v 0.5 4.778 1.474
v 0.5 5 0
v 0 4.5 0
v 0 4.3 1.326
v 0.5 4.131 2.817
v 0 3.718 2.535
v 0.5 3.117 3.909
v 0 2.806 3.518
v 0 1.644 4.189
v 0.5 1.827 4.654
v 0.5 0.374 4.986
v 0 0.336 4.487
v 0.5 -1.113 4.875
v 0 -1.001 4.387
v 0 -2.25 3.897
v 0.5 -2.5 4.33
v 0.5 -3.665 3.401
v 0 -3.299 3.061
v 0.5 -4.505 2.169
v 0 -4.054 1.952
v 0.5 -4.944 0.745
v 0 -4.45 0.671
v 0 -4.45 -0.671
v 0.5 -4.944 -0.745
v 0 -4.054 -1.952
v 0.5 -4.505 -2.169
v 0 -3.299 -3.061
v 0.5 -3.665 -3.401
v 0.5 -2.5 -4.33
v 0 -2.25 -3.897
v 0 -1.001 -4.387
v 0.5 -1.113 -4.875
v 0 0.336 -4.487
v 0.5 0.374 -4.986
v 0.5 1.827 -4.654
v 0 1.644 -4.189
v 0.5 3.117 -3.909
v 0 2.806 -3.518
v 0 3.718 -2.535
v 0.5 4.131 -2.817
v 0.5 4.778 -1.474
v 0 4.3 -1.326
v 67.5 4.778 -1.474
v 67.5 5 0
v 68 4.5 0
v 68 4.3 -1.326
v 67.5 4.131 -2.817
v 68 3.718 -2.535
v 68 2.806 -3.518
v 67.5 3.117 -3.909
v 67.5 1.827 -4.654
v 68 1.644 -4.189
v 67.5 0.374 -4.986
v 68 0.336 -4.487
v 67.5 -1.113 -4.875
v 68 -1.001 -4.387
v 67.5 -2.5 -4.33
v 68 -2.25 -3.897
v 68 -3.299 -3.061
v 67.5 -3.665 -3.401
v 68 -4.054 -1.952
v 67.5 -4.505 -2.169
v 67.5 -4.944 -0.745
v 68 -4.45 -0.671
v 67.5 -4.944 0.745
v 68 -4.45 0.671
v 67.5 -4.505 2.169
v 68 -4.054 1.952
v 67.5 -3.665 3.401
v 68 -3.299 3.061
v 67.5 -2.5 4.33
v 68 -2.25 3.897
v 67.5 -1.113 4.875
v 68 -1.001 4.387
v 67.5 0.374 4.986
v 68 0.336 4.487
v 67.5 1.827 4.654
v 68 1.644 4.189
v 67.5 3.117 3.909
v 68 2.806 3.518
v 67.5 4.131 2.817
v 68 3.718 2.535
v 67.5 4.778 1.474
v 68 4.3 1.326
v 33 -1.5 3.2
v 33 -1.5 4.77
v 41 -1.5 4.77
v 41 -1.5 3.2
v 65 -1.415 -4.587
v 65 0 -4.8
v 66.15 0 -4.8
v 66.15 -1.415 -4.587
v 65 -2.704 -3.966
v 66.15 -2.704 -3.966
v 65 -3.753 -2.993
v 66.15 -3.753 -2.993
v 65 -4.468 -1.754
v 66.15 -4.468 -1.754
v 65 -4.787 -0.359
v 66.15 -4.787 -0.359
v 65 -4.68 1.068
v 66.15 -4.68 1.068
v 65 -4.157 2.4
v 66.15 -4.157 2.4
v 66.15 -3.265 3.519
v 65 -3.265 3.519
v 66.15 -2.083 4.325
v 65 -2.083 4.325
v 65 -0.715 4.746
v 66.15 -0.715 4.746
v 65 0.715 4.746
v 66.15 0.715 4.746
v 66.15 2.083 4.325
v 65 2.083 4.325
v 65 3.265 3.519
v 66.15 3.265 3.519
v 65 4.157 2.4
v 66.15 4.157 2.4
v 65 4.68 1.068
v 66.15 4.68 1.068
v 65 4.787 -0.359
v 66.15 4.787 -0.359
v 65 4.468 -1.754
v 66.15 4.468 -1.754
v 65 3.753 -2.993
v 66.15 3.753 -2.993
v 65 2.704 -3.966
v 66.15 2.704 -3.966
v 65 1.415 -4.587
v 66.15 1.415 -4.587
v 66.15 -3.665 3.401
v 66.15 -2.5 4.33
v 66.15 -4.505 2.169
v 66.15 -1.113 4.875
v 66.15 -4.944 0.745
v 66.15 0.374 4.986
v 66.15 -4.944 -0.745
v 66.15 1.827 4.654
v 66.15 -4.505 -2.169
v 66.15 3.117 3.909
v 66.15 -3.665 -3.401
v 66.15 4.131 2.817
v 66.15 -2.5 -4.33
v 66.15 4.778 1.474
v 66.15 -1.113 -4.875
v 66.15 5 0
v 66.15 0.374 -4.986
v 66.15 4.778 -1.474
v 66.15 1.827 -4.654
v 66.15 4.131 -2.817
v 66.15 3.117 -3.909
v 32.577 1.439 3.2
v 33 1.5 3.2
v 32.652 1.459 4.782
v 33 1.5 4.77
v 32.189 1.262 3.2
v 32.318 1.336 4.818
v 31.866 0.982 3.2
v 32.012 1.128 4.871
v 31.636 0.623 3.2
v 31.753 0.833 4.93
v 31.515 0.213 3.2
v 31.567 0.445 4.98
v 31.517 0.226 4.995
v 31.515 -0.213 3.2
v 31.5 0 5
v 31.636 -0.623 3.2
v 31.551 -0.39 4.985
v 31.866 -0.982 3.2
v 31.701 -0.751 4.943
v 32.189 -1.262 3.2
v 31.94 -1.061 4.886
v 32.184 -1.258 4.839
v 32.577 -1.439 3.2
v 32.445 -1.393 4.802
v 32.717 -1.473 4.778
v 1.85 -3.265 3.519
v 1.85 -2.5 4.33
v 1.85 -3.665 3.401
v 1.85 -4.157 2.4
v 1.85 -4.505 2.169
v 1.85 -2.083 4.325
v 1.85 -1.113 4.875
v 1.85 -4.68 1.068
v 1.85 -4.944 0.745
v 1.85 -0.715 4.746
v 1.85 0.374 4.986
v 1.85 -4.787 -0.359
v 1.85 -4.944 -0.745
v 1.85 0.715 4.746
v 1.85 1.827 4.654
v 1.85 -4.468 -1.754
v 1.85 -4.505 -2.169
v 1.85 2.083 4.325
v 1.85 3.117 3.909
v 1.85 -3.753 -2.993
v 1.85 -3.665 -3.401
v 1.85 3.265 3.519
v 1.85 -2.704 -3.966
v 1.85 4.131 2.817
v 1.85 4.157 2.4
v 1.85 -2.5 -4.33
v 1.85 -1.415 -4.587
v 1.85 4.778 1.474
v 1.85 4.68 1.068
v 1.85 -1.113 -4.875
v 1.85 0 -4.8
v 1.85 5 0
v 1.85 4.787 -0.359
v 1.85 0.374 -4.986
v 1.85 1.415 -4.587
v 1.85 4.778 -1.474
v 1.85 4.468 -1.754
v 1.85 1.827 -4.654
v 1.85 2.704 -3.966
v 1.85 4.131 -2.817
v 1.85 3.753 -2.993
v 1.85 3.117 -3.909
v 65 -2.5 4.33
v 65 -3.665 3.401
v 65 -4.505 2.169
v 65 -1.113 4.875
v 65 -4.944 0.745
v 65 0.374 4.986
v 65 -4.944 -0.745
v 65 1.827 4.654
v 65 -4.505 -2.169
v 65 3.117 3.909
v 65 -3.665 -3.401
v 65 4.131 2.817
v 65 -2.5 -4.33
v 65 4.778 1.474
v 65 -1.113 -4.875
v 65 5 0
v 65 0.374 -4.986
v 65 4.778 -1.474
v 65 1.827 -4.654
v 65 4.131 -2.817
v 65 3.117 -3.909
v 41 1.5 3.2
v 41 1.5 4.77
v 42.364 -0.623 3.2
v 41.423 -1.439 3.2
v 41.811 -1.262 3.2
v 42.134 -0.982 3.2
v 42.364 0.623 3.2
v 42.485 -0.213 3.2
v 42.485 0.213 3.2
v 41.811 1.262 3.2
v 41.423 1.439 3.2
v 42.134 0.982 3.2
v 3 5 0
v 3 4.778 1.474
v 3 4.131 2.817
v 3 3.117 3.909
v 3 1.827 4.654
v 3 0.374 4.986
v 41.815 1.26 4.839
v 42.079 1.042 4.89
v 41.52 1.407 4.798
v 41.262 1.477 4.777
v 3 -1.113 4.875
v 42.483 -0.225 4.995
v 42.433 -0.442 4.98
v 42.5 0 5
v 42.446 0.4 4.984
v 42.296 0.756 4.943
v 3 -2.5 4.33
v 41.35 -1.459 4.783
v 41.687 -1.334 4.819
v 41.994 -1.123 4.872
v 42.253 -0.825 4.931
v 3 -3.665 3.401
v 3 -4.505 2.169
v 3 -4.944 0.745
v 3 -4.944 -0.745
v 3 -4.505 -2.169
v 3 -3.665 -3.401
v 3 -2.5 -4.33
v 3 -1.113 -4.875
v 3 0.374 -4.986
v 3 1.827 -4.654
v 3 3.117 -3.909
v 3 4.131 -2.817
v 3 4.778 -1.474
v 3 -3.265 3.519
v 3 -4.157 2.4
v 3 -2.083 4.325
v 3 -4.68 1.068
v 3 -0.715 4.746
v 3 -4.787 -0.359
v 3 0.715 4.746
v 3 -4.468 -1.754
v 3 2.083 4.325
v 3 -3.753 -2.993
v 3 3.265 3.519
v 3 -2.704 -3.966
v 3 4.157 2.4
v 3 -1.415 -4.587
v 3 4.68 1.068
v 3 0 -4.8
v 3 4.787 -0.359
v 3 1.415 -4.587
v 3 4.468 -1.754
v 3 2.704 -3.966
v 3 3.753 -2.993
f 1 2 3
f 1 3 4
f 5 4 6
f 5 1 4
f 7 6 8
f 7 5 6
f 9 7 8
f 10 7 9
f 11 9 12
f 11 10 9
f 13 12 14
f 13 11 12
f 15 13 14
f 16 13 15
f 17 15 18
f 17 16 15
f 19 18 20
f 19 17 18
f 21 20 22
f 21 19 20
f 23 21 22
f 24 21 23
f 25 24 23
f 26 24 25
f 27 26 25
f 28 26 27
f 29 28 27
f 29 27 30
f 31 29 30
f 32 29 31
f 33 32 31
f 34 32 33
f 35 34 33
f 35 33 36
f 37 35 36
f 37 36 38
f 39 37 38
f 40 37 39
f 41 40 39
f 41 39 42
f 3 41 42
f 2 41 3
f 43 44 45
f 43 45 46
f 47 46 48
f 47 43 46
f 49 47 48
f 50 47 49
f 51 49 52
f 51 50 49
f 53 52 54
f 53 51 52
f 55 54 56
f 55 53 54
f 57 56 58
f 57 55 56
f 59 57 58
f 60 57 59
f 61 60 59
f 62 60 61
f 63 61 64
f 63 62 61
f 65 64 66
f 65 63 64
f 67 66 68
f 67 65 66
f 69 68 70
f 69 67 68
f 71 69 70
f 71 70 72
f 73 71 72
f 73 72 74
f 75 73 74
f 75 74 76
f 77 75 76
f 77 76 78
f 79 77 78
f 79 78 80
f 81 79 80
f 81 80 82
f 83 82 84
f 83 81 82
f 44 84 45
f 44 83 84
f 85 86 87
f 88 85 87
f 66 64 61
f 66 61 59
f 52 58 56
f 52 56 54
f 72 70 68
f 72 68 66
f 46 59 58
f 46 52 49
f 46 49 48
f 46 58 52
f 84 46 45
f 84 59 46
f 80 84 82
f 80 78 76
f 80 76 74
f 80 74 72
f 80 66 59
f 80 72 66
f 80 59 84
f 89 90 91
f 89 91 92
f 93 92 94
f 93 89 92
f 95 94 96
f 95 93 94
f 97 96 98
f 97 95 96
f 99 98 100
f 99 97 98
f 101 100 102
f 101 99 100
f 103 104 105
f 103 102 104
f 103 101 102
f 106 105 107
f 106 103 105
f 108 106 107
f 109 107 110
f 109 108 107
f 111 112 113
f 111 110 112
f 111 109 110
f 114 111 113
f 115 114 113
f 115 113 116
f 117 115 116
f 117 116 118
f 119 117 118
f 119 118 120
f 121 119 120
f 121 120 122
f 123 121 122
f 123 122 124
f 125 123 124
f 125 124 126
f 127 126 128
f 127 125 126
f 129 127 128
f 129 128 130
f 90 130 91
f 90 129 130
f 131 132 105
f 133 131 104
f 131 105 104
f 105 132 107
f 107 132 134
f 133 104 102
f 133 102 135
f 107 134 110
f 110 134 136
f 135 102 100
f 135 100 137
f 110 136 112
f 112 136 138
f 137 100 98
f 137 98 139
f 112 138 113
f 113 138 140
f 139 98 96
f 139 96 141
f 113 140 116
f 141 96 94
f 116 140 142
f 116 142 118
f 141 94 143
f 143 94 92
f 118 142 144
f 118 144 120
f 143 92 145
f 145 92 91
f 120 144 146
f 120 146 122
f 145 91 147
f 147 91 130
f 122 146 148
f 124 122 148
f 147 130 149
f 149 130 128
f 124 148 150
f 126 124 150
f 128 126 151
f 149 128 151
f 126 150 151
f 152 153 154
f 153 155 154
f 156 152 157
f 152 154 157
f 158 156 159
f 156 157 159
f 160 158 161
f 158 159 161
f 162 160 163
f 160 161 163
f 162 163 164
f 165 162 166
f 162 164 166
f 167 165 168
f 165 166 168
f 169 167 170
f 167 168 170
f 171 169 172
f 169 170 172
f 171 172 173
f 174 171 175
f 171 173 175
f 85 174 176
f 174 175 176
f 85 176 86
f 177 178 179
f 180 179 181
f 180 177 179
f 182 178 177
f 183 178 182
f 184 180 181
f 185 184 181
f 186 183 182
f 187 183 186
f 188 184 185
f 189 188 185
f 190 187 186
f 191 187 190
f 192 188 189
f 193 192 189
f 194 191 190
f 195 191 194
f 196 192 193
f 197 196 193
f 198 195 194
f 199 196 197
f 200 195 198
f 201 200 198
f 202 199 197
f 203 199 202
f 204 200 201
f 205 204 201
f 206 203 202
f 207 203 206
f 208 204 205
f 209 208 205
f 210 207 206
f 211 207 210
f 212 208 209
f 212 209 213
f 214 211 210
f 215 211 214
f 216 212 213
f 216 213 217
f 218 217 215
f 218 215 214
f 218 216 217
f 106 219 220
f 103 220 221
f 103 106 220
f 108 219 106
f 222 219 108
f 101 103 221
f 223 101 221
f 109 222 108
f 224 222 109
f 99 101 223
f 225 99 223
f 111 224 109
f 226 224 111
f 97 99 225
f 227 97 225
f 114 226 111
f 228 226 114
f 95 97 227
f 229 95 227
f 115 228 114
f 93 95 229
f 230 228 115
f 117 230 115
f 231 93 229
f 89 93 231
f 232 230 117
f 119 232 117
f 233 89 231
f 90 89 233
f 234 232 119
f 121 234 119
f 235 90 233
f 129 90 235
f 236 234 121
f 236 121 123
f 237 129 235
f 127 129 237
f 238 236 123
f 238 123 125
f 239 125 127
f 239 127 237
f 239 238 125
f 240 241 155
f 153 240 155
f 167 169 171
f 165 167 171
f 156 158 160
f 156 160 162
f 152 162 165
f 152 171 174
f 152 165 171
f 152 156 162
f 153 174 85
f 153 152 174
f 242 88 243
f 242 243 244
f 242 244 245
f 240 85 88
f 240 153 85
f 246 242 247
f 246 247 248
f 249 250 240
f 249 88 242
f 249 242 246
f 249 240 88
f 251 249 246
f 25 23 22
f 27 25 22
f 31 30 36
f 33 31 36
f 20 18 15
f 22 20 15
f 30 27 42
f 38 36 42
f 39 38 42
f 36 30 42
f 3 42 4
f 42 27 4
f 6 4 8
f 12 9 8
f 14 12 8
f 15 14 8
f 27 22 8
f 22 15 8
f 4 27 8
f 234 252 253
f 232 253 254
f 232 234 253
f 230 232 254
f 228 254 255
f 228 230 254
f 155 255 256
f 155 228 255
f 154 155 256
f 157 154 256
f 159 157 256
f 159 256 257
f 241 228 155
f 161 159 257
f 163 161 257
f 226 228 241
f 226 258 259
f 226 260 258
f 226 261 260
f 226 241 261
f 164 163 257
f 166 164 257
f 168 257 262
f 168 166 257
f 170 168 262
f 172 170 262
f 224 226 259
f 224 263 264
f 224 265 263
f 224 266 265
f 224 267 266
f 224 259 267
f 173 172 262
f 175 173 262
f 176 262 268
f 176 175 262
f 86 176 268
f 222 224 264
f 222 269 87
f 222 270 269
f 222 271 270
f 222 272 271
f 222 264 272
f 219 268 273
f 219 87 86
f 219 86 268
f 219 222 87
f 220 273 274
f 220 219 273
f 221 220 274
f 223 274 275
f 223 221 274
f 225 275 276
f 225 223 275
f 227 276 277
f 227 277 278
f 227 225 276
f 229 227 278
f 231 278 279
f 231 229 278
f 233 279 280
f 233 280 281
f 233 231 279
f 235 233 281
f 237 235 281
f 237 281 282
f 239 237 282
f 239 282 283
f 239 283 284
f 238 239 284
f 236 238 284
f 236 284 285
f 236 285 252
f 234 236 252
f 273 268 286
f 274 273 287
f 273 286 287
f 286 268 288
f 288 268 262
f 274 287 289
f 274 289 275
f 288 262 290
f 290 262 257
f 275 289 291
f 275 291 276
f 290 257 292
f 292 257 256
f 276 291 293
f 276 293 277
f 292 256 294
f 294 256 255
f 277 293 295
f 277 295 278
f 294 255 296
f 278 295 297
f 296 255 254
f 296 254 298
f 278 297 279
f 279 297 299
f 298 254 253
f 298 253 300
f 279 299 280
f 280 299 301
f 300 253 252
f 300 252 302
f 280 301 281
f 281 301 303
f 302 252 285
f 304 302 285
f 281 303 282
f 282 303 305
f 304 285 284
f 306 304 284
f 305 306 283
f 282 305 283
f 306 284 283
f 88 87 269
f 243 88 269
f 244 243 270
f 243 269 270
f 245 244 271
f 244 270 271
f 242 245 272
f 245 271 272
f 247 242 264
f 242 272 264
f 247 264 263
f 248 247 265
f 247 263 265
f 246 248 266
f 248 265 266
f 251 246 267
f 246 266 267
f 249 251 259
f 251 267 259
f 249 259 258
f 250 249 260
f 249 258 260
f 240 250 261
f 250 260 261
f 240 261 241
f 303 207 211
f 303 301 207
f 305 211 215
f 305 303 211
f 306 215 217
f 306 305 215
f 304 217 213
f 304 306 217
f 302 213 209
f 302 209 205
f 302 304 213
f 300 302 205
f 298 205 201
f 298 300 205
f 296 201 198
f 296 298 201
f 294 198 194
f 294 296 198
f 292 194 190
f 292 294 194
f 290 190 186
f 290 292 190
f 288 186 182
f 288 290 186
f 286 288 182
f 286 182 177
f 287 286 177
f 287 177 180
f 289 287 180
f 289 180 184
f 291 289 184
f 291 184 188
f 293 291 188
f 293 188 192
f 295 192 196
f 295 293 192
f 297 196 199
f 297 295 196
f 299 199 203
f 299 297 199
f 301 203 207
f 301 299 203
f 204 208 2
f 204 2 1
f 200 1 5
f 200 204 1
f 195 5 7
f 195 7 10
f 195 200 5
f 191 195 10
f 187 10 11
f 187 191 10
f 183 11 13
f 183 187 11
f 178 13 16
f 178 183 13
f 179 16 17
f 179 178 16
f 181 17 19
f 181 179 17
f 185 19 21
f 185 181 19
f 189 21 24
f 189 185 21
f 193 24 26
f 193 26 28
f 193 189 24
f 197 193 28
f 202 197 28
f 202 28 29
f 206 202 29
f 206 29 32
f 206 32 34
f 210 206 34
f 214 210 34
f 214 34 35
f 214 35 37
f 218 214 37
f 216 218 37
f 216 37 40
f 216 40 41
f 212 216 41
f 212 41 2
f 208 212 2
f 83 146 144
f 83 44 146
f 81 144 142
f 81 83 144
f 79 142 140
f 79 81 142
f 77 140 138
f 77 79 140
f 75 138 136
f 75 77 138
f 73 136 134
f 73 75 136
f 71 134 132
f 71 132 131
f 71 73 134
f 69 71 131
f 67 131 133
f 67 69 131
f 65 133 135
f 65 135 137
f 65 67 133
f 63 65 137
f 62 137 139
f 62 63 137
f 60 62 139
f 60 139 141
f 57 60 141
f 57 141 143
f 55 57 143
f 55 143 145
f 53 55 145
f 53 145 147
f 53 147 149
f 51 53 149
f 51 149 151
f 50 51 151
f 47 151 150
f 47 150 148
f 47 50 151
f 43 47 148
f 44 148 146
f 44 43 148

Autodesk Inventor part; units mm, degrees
sketch "Sketch_1" plane through (0, 0, 0) normal (0, 0, 1) x (1, 0, 0)
  line L0 (68, 0) -> (0, 0)
  line L1 (0, 0) -> (0, 4.5)
  line L2 (0, 4.5) -> (0.5, 5)
  line L3 (0.5, 5) -> (67.5, 5)
  line L4 (67.5, 5) -> (68, 4.5)
  line L5 (68, 4.5) -> (68, 0)
  line L6 (68, 0) -> (0, 0)
revolve "Revolution1" add sketch "Sketch_1" angle 360 about axis through (68, 0, 0) along (1, 0, 0)
sketch "_____10" plane through (0, 0, 5) normal (0, 0, 1) x (1, 0, 0)
  arc A0 (33, 1.5) -> (33, -1.5) centre (33, 0) ccw
  line L0 (33, -1.5) -> (41, -1.5)
  arc A1 (41, -1.5) -> (41, 1.5) centre (41, 0) ccw
  line L1 (41, 1.5) -> (33, 1.5)
extrude "Extrusion1" cut sketch "_____10" against normal blind 1.8
sketch "_____5" plane through (3, 0, 0) normal (1, 0, 0) x (0, 0, -1)
  circle A0 centre (0, 0) radius 10
  circle A1 centre (0, 0) radius 4.8
extrude "Extrusion2" cut sketch "_____5" against normal blind 1.15
sketch "_____6" plane through (65, 0, 0) normal (1, 0, 0) x (0, 0, -1)
  circle A0 centre (0, 0) radius 10
  circle A1 centre (0, 0) radius 4.8
extrude "Extrusion3" cut sketch "_____6" along normal blind 1.15
ref_plane "COMBINATION_MODULE_XY" through (0, 0, 0) normal (1, 0, 0) x (0, 0, -1)
ref_plane "COMBINATION_MODULE_YZ" through (0, 0, 0) normal (0, 0, -1) x (0, 1, 0)
ref_plane "COMBINATION_MODULE_ZX" through (0, 0, 0) normal (0, 1, 0) x (1, 0, 0)
ref_plane "to_ring_b_XY" through (2.425, 0, 0) normal (1, 0, 0) x (0, 0, -1)
ref_plane "to_ring_b_YZ" through (2.425, 0, 0) normal (0, 0, -1) x (0, 1, 0)
ref_plane "to_ring_b_ZX" through (2.425, 0, 0) normal (0, 1, 0) x (1, 0, 0)
ref_plane "to_ring_s_XY" through (65.575, 0, 0) normal (1, 0, 0) x (0, 0, -1)
ref_plane "to_ring_s_YZ" through (65.575, 0, 0) normal (0, 0, -1) x (0, 1, 0)
ref_plane "to_ring_s_ZX" through (65.575, 0, 0) normal (0, 1, 0) x (1, 0, 0)
properties part number "NSFMRRA10-68-B3-S3-KC31.5-A11(000_000)_s"
